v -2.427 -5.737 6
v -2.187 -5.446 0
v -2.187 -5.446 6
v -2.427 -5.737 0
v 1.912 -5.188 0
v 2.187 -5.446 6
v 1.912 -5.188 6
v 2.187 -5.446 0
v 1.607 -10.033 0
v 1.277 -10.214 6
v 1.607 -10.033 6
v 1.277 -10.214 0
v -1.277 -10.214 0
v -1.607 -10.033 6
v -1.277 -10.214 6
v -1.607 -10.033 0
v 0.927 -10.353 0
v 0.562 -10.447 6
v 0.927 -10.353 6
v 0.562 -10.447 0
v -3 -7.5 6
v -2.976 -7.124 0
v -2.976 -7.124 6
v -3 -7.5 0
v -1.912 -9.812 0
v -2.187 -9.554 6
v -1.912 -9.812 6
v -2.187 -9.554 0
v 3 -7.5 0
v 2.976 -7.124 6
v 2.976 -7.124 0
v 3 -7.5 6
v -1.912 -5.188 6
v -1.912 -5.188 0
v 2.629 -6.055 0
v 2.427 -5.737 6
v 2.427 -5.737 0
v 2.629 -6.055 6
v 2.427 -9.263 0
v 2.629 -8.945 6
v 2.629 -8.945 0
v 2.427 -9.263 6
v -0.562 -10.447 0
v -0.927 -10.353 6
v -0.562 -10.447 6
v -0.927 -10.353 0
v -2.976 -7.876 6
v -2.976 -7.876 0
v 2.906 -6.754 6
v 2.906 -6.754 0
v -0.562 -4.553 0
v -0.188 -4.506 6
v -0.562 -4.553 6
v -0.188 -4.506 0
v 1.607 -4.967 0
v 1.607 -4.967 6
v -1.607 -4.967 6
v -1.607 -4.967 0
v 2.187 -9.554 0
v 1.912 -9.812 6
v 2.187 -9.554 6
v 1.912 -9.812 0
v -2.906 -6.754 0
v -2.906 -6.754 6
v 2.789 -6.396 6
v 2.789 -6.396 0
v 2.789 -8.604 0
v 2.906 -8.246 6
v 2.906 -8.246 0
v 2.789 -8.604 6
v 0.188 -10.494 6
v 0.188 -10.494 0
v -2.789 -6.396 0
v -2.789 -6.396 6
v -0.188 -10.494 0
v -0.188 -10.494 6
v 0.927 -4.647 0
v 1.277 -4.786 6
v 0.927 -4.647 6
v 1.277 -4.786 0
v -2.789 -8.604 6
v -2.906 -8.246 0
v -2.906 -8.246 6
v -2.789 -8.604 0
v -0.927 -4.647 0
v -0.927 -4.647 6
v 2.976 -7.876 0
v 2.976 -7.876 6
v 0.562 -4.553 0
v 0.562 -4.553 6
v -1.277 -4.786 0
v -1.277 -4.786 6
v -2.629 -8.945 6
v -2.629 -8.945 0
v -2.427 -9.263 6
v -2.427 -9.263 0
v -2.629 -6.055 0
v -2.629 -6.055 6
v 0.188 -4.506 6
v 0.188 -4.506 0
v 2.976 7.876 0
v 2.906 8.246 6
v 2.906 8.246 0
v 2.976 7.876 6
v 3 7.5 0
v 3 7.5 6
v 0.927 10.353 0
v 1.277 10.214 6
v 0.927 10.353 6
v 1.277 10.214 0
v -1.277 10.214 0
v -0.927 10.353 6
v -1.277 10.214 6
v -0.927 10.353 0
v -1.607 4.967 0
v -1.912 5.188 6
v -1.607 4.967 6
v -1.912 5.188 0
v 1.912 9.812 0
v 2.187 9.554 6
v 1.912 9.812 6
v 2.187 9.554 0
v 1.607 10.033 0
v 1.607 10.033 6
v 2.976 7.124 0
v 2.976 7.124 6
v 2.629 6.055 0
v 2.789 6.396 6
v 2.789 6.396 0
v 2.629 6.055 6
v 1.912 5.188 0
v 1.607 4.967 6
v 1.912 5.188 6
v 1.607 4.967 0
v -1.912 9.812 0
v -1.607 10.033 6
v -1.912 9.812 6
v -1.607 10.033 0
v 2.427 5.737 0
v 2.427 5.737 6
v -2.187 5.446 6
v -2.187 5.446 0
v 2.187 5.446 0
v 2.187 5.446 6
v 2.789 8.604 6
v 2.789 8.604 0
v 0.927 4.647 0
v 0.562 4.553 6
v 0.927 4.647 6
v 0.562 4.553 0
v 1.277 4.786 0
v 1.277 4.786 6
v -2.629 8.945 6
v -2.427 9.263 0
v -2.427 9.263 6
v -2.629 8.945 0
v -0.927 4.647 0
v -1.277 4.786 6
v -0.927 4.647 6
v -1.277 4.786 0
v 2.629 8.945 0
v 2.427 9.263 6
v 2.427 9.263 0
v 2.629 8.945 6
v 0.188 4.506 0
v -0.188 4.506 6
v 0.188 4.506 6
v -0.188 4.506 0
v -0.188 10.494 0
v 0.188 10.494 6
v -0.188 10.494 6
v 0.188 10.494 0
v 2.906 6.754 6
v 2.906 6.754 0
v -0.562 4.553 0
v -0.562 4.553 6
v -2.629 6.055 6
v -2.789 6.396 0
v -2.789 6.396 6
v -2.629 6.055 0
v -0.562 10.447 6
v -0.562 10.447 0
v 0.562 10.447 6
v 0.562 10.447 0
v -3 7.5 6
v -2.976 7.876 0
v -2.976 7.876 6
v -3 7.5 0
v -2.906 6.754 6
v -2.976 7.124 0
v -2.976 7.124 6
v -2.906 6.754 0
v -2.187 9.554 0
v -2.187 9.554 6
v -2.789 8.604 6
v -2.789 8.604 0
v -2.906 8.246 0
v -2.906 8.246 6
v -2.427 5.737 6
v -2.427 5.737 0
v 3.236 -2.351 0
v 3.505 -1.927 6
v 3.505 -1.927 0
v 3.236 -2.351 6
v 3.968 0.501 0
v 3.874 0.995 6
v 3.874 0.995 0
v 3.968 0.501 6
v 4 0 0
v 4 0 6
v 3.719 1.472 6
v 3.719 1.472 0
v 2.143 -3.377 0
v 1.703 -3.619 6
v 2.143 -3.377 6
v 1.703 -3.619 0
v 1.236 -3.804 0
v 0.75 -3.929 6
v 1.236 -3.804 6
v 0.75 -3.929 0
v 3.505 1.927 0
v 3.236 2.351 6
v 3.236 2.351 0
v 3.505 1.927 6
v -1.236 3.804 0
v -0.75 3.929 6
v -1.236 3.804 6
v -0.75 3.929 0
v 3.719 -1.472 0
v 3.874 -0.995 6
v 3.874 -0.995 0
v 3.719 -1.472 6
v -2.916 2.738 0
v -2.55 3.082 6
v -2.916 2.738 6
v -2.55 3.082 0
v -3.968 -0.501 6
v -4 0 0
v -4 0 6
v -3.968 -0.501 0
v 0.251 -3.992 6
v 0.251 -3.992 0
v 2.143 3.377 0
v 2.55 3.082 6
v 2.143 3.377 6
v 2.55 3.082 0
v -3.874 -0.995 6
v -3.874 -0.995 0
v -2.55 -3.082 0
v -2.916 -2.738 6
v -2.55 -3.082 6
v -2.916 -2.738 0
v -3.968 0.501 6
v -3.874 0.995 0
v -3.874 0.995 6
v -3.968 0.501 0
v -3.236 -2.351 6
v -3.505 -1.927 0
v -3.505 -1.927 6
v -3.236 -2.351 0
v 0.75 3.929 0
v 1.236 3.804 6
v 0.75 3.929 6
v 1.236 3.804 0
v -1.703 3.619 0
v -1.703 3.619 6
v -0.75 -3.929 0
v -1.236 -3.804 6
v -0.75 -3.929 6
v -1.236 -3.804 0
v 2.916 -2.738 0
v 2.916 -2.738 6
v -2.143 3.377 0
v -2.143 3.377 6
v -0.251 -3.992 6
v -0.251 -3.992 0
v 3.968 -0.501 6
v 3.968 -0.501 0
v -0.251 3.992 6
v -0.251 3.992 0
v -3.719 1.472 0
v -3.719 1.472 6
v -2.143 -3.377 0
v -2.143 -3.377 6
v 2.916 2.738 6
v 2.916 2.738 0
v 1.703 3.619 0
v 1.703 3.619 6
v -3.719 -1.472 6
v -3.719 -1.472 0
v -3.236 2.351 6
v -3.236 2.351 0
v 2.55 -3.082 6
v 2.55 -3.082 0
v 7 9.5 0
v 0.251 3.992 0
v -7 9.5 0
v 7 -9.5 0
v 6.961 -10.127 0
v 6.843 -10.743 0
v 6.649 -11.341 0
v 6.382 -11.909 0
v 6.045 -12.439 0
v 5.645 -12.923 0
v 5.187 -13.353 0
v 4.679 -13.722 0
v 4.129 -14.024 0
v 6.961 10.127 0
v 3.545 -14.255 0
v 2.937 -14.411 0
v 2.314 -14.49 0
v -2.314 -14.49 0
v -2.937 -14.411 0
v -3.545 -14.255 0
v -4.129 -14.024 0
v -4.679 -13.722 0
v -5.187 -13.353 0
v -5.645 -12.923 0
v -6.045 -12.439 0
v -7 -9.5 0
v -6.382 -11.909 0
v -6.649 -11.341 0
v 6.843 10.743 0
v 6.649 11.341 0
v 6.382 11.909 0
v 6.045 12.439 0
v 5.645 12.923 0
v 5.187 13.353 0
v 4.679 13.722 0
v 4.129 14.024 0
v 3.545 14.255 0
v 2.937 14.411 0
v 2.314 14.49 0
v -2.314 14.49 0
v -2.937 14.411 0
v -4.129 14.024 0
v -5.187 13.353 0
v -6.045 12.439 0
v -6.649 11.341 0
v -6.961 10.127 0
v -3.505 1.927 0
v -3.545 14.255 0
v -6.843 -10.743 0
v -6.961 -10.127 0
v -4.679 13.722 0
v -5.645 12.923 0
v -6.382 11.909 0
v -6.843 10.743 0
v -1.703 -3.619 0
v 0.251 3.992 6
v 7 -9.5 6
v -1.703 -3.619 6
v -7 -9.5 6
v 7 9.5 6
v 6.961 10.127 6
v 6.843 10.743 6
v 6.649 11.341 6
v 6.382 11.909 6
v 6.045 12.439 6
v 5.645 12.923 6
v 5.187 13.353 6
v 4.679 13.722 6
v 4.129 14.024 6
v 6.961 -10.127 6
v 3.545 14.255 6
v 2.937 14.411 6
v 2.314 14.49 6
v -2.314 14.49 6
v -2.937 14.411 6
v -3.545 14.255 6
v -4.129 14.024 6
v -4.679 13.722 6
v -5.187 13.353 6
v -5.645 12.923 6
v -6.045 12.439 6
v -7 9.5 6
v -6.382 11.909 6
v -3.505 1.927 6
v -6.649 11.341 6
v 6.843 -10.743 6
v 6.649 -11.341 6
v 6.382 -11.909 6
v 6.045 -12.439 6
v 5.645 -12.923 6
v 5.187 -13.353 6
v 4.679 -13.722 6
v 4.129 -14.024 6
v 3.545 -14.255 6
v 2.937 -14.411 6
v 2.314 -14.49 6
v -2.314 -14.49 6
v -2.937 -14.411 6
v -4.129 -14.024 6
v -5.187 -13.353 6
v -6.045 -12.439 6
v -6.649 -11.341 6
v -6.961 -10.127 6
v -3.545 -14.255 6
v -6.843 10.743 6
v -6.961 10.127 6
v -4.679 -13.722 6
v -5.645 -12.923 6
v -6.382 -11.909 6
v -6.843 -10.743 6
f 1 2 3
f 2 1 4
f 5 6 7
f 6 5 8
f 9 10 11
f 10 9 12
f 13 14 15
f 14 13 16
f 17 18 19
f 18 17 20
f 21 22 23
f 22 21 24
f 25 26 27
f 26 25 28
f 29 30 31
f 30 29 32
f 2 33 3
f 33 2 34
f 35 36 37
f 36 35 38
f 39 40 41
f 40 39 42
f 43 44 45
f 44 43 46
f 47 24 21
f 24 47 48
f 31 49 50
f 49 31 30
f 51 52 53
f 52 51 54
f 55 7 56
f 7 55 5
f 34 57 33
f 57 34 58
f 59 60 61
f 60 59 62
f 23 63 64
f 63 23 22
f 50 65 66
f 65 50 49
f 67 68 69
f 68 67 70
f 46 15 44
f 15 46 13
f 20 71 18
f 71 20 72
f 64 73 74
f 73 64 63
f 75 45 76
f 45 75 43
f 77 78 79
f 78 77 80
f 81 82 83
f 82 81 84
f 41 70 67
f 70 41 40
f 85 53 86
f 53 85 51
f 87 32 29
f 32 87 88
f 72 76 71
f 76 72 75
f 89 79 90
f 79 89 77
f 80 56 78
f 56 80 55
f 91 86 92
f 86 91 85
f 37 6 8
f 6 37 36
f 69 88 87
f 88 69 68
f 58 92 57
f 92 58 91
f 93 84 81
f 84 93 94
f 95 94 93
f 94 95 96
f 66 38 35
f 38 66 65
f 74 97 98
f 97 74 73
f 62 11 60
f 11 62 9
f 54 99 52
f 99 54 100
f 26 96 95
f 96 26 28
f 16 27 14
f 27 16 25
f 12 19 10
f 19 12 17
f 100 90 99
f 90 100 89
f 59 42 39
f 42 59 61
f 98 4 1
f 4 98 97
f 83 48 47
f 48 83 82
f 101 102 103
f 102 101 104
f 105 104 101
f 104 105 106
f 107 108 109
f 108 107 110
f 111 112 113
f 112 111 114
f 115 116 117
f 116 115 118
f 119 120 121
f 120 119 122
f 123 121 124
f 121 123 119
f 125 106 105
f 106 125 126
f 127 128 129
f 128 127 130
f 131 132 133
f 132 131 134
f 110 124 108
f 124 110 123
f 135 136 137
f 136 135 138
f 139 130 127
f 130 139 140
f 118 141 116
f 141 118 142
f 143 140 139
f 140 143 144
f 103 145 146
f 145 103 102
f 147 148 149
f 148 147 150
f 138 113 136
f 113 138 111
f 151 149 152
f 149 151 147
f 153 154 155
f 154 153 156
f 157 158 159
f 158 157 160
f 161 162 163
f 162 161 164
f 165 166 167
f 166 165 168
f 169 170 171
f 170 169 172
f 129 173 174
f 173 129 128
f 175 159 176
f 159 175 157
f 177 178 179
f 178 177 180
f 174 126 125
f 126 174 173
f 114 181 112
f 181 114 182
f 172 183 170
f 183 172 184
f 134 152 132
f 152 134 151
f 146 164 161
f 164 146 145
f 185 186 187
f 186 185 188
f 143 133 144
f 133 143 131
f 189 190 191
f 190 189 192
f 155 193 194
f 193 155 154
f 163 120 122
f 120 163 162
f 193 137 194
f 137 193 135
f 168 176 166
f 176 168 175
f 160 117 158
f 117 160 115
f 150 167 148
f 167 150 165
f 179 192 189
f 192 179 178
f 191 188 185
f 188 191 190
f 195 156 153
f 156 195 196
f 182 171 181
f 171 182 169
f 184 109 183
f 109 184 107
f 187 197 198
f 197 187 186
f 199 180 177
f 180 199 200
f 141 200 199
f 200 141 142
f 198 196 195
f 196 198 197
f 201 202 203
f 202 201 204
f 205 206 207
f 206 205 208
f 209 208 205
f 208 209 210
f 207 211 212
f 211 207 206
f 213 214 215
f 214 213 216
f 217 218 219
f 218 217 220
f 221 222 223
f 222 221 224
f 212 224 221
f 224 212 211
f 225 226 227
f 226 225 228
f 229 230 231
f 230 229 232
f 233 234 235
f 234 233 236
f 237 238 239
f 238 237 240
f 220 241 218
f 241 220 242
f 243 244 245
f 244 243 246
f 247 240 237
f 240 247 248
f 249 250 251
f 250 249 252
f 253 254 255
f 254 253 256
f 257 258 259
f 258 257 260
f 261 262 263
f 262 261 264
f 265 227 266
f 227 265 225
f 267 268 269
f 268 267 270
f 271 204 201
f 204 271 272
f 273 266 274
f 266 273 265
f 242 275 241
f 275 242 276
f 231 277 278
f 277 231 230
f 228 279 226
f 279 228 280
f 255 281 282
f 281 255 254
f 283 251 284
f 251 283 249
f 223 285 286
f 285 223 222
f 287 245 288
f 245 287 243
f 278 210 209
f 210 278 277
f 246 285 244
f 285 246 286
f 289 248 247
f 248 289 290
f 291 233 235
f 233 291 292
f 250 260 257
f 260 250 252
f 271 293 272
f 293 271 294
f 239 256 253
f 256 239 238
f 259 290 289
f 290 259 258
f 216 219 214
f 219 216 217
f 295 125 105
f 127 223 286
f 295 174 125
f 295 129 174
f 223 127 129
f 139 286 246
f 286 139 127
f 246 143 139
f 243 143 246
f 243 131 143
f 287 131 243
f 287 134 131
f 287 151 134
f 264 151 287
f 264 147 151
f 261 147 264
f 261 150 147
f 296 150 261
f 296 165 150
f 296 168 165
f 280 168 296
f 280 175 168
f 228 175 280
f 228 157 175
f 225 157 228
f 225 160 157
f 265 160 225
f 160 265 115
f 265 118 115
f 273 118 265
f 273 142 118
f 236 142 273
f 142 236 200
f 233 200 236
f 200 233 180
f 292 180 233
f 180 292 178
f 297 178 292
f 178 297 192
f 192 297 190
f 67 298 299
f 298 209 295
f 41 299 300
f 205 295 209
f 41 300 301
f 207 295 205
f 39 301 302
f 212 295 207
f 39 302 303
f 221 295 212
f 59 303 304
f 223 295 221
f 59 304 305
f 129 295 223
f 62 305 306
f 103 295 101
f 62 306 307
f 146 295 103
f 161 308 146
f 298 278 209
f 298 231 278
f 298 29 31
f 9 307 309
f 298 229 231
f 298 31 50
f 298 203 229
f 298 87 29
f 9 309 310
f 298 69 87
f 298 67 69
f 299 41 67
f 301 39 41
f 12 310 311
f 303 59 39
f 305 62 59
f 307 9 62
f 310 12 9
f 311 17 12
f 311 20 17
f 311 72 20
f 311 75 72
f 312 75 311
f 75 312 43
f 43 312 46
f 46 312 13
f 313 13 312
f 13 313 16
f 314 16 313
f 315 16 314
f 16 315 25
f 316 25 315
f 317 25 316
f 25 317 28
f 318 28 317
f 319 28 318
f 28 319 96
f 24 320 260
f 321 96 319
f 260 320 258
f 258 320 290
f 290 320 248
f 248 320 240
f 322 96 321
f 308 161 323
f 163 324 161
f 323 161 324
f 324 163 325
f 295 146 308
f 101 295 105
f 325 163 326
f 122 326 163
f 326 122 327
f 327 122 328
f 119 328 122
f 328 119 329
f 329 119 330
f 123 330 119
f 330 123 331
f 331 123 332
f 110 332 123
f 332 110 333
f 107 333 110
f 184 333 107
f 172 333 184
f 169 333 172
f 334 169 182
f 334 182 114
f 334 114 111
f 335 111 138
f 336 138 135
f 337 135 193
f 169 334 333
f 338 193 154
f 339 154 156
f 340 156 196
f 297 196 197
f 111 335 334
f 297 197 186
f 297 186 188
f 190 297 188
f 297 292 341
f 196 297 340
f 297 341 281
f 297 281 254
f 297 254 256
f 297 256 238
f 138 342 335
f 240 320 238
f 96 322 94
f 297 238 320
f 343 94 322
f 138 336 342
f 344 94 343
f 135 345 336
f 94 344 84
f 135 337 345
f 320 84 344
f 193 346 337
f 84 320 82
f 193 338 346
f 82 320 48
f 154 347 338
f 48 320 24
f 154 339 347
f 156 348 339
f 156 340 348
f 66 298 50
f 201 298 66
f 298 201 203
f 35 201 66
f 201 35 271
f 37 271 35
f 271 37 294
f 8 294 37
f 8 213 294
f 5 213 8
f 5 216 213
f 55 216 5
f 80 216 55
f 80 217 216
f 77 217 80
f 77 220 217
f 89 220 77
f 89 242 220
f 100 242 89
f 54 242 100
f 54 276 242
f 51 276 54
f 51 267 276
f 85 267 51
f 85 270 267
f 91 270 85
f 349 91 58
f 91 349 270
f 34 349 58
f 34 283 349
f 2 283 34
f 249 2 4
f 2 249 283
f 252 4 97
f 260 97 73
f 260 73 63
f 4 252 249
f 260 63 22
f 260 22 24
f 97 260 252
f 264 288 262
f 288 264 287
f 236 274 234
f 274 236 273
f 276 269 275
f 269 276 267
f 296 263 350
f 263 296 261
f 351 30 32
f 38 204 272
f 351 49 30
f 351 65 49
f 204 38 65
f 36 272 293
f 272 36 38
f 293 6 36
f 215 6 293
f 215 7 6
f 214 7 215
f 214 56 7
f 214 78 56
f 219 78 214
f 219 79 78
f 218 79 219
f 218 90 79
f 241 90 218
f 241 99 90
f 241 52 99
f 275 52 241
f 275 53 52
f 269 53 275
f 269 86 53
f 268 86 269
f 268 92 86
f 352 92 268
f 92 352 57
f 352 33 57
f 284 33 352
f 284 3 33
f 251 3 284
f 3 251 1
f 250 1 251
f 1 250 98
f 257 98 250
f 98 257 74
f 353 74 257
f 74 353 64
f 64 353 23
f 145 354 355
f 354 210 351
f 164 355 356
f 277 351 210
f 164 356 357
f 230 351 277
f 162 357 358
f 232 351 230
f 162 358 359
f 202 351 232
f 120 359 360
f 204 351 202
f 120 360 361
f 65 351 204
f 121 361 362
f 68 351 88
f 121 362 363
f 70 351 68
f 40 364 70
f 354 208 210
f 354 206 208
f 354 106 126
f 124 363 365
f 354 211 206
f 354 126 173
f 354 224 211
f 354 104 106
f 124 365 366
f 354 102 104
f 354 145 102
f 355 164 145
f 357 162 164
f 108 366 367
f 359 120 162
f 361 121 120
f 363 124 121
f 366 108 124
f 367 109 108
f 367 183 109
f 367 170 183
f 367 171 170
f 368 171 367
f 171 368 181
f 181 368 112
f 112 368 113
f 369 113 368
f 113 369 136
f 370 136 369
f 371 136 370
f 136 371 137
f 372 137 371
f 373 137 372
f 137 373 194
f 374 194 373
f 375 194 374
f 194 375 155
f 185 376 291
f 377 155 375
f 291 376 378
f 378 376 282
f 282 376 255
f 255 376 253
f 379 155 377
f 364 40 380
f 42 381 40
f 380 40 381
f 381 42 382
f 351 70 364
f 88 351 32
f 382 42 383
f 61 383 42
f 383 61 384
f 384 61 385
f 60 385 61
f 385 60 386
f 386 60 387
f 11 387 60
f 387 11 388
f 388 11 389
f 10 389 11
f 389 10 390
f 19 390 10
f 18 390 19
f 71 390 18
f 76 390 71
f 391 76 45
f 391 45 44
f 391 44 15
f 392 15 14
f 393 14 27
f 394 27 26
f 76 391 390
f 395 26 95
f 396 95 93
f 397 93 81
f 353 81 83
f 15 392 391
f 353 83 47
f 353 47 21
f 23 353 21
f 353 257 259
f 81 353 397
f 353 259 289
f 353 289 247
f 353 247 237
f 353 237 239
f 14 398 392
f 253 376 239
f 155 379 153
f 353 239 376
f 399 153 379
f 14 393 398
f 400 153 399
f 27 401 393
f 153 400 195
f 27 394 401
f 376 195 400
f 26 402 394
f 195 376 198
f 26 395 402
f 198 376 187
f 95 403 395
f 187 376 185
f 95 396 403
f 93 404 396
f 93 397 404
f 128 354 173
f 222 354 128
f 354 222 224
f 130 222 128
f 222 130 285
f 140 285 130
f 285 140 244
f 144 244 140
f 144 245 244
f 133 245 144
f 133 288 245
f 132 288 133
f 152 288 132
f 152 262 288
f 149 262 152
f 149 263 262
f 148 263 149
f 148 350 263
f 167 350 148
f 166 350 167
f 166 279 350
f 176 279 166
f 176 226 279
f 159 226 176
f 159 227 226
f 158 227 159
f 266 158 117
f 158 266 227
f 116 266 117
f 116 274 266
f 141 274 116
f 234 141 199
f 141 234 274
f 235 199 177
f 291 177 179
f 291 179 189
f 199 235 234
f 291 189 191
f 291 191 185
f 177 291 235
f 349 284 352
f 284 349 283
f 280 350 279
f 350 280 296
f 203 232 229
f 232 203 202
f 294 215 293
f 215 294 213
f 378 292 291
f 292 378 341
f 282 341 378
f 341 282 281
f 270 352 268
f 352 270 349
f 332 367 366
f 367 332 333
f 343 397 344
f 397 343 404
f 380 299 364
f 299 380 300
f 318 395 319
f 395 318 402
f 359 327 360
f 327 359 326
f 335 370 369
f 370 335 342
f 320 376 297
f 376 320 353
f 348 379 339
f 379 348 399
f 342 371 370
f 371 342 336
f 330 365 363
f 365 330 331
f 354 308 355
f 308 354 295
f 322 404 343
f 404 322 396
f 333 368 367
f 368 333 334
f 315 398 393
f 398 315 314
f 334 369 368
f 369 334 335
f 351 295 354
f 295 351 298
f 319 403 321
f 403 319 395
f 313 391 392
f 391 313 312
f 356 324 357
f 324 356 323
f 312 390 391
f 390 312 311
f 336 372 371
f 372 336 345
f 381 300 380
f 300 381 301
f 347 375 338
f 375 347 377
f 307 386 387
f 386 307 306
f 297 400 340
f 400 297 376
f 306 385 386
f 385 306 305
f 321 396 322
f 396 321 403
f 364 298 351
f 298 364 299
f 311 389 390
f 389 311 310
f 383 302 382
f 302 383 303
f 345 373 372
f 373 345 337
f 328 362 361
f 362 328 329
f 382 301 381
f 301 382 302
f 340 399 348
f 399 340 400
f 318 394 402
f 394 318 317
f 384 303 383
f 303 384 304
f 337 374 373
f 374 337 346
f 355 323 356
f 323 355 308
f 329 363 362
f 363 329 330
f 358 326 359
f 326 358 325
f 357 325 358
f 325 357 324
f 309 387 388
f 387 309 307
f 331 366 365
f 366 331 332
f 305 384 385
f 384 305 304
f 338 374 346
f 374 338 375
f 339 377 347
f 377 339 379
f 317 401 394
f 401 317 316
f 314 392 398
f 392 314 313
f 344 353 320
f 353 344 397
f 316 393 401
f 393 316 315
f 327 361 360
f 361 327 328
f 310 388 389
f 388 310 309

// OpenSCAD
$fn = 50;


difference() {
	union() {
		hull() {
			translate(v = [-2.0000000000, 9.5000000000, 0]) {
				cylinder(h = 6, r = 5);
			}
			translate(v = [2.0000000000, 9.5000000000, 0]) {
				cylinder(h = 6, r = 5);
			}
			translate(v = [-2.0000000000, -9.5000000000, 0]) {
				cylinder(h = 6, r = 5);
			}
			translate(v = [2.0000000000, -9.5000000000, 0]) {
				cylinder(h = 6, r = 5);
			}
		}
	}
	union() {
		#translate(v = [0.0000000000, -7.5000000000, -100.0000000000]) {
			cylinder(h = 200, r = 3.0000000000);
		}
		#translate(v = [0.0000000000, -7.5000000000, -100.0000000000]) {
			cylinder(h = 200, r = 3.0000000000);
		}
		#translate(v = [0.0000000000, 7.5000000000, -100.0000000000]) {
			cylinder(h = 200, r = 3.0000000000);
		}
		#translate(v = [0.0000000000, 7.5000000000, -100.0000000000]) {
			cylinder(h = 200, r = 3.0000000000);
		}
		#cylinder(h = 6, r = 4.0000000000);
	}
}
